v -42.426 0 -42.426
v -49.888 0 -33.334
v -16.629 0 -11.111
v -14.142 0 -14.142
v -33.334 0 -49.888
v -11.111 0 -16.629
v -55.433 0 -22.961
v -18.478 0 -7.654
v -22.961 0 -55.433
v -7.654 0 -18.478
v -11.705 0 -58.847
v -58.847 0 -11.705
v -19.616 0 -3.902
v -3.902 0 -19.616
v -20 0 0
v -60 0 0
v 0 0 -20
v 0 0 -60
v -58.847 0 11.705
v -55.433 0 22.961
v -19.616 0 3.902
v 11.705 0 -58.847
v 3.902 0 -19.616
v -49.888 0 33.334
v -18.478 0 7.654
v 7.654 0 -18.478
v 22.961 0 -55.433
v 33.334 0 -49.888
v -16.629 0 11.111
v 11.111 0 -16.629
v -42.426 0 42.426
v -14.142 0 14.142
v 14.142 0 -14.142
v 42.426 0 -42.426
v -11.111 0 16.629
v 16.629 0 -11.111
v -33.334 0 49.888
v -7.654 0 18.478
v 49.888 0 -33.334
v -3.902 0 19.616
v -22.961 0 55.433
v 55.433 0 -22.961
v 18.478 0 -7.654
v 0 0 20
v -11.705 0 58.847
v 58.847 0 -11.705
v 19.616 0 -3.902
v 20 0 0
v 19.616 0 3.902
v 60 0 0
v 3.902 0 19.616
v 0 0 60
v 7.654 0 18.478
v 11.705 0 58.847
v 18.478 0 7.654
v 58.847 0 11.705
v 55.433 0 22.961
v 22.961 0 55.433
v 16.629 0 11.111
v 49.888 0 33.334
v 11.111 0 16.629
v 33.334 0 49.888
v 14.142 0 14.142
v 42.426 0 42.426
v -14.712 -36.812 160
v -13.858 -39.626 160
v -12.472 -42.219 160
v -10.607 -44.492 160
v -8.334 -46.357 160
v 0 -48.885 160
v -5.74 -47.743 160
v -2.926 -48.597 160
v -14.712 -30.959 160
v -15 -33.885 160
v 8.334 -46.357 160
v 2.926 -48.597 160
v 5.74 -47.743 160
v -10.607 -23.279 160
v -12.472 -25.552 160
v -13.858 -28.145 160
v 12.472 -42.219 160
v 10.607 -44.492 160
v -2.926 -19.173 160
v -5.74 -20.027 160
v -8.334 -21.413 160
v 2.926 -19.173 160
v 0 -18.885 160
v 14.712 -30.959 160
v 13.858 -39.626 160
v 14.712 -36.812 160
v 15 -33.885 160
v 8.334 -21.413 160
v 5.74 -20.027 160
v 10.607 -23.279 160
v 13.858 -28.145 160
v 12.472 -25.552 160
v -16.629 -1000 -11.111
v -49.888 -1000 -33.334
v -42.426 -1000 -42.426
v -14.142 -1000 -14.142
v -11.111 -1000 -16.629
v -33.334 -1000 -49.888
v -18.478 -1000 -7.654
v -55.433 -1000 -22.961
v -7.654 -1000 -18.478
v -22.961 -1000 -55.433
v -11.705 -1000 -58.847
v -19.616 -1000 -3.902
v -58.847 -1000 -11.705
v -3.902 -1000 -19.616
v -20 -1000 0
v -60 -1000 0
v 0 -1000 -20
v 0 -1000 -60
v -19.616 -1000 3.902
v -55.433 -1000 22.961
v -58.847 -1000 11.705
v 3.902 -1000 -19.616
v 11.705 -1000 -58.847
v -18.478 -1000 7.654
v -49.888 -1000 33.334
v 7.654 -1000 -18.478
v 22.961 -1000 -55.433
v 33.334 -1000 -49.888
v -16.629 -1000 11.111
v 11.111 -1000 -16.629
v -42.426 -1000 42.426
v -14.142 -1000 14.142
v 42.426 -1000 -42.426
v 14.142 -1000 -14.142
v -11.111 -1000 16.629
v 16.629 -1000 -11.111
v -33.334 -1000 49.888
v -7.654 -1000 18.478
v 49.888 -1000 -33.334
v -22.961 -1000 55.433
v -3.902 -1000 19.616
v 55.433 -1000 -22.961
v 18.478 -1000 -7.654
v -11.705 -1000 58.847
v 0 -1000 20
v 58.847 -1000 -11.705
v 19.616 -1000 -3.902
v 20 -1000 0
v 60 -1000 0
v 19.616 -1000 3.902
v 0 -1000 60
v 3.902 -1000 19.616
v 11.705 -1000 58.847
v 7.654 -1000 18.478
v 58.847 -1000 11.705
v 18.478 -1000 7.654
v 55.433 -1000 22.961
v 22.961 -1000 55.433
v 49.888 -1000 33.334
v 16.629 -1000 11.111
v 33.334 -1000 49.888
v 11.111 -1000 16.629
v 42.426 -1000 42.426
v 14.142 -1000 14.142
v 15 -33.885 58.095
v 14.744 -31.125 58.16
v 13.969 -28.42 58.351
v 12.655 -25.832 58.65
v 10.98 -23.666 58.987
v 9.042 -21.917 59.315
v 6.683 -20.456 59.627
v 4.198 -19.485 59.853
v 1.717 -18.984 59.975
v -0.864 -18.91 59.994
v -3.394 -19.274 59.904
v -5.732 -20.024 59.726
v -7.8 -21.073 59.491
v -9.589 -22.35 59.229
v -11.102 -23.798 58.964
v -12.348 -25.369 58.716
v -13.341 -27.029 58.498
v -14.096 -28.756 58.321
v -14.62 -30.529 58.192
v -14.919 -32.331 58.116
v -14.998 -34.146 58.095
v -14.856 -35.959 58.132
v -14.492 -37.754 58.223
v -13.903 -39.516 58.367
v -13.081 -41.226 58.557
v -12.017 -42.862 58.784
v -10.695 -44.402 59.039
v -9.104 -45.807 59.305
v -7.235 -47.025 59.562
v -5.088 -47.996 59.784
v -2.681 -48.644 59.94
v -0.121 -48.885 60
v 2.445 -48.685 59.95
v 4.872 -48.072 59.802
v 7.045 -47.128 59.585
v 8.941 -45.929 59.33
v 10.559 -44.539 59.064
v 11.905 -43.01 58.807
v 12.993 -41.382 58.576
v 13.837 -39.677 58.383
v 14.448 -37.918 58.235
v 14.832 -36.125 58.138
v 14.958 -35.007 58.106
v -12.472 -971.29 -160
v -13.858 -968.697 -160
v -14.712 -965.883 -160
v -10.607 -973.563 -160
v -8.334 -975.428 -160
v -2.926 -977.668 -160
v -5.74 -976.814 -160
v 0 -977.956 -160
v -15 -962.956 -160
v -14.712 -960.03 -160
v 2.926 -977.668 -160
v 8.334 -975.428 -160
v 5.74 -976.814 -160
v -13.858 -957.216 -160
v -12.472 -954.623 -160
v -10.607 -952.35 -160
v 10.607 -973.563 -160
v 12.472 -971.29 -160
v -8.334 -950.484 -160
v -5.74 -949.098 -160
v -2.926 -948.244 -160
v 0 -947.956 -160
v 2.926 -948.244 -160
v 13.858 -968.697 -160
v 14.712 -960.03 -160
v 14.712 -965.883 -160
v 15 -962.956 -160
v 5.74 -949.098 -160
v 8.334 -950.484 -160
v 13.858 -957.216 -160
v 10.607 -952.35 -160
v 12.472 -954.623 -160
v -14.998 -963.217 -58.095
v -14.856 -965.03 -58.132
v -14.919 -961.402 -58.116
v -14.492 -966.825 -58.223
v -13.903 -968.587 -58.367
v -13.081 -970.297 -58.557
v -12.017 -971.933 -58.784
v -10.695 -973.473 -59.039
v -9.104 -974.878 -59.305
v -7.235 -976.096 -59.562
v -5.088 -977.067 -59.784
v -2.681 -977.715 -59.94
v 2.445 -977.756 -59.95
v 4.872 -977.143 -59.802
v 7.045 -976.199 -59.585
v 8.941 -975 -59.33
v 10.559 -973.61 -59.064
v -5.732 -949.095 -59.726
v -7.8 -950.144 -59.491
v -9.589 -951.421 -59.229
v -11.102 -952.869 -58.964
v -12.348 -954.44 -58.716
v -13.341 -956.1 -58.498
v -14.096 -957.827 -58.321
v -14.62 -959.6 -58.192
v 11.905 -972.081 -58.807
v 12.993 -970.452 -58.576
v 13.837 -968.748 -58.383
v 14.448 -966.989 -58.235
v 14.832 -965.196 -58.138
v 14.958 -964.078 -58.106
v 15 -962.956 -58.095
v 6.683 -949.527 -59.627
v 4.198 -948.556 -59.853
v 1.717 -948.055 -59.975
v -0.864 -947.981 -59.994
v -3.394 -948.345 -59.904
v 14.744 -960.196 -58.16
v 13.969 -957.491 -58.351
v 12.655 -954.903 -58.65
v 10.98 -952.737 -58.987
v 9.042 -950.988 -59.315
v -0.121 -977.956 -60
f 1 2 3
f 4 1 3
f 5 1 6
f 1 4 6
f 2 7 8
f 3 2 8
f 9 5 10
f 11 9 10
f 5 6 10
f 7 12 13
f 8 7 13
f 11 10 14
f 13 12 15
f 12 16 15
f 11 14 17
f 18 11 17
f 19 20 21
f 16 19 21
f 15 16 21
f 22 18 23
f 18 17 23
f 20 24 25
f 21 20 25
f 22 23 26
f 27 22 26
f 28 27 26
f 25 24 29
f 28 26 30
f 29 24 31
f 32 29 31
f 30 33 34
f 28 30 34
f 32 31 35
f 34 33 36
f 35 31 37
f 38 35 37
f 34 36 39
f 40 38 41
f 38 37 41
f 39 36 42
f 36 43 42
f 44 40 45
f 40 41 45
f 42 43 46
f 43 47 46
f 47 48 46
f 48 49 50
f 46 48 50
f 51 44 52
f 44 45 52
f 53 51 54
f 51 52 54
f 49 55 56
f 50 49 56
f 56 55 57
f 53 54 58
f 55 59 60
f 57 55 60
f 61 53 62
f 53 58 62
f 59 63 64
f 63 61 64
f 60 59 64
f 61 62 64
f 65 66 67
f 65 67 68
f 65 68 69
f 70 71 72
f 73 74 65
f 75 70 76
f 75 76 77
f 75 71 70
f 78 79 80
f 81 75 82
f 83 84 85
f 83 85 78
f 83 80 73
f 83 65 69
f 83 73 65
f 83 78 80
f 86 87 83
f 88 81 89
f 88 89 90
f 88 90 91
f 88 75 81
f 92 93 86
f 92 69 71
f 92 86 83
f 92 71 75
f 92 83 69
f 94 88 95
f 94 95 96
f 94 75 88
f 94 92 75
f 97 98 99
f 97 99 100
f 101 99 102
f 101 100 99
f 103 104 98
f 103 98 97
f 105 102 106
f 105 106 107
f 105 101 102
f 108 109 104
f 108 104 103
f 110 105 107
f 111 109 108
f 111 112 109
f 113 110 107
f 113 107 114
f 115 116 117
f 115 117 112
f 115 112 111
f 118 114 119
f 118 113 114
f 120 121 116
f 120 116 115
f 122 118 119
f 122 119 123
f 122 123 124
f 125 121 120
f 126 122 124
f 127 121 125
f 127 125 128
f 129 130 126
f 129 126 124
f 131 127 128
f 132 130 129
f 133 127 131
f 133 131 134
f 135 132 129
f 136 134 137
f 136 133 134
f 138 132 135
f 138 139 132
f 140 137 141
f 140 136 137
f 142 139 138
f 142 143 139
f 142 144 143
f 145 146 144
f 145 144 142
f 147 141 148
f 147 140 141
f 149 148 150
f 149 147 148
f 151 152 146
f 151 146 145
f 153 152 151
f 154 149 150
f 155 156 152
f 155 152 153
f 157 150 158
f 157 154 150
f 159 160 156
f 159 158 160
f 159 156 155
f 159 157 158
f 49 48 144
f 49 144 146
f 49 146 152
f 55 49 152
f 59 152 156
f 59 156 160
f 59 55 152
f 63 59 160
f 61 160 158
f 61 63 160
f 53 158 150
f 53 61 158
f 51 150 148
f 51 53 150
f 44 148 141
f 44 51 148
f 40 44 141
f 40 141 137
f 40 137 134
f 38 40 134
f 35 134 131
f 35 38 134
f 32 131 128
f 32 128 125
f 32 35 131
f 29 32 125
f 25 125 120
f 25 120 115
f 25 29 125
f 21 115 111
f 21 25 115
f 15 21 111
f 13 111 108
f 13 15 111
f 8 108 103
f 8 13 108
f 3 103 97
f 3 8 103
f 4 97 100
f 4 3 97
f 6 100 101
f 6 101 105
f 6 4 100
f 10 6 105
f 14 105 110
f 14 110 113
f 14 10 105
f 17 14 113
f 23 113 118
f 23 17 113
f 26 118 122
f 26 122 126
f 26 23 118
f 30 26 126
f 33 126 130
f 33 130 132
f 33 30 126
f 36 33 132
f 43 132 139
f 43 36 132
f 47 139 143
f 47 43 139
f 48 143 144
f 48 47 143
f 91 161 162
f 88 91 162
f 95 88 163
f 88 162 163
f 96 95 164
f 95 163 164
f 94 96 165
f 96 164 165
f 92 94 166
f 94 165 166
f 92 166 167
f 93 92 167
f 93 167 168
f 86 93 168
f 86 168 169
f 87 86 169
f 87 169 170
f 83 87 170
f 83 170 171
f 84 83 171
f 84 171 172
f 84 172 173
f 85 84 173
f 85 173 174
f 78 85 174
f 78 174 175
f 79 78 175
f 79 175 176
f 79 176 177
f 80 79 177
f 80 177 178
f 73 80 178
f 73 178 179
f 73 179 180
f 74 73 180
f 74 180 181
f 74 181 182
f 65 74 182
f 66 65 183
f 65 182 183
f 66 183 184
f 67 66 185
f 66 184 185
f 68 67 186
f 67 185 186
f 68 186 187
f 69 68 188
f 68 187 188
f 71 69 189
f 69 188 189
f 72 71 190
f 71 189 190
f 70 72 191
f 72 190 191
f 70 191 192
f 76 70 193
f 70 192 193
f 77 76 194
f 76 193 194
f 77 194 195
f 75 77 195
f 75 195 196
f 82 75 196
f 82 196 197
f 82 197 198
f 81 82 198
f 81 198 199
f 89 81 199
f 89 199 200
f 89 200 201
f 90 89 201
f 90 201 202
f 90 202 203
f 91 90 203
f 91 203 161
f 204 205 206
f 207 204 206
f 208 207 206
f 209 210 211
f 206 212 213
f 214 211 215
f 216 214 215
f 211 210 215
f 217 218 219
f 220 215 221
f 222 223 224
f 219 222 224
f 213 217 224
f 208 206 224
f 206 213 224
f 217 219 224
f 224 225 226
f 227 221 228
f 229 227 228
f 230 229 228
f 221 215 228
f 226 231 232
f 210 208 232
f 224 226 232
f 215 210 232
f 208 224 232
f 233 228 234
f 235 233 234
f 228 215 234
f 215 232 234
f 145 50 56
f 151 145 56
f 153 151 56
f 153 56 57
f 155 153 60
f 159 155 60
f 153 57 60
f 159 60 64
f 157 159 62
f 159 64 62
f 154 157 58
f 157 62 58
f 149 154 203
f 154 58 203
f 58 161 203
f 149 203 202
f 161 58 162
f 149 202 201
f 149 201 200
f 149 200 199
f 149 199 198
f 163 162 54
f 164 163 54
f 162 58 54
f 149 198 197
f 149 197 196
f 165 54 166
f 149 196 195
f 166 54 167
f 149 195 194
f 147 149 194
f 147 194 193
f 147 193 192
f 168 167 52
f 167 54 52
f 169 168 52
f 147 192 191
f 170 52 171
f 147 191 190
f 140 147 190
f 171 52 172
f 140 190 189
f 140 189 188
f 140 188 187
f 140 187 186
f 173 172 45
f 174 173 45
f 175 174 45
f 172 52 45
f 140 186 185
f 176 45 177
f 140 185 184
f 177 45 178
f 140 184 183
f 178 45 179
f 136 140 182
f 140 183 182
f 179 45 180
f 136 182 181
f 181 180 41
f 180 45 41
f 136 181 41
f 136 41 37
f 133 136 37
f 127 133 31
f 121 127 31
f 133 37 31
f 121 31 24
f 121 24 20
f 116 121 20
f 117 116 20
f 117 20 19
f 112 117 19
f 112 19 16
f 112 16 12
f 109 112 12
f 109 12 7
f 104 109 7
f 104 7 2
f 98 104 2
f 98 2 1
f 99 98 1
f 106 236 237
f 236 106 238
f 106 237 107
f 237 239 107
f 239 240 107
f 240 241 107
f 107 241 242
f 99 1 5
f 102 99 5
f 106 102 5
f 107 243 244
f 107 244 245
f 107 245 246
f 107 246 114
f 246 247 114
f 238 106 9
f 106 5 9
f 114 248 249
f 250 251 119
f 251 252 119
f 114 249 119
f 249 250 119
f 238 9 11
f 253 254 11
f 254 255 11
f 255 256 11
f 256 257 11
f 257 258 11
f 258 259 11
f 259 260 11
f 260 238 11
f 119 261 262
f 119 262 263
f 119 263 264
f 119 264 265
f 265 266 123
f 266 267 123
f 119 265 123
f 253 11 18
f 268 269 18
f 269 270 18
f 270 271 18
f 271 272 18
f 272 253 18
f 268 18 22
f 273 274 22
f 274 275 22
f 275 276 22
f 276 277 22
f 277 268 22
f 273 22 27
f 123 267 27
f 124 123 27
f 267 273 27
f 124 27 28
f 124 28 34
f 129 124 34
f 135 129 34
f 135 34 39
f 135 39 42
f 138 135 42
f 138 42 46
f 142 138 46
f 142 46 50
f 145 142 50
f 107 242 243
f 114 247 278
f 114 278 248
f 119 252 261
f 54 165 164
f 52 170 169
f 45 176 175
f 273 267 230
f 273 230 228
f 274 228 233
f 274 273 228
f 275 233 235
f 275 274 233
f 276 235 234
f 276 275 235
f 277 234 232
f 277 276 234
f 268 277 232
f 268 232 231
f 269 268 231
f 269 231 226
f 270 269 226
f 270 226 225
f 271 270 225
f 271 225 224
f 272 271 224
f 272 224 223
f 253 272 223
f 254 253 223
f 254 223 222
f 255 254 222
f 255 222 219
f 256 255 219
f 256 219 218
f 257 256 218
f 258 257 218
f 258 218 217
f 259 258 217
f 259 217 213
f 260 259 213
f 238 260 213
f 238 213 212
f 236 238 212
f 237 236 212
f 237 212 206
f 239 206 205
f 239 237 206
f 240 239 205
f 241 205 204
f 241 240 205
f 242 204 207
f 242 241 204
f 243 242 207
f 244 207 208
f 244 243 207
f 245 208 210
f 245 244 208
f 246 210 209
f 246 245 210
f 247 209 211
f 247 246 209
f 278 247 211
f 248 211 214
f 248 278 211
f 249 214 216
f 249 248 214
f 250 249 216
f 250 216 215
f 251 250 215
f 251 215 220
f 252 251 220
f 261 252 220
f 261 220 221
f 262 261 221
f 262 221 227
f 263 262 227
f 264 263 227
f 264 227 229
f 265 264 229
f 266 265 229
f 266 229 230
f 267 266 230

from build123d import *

# Parameters (mm, degrees)
F0_R     = 60
F2_DEPTH = 1000
F3_R     = 15
F4_DEPTH = 160
F5_R     = 15
F6_DEPTH = 160
F1_R     = 20
F7_DEPTH = 1000


with BuildPart() as f2:
    # F0 (on Front) → F2 (new body)
    with BuildSketch(Plane.XZ):
        Circle(F0_R)
    extrude(amount=F2_DEPTH)

    # F3 (on Top) → F4 (join)
    with BuildSketch(Plane.XY):
        with Locations((0, -33.885266772)):
            Circle(F3_R)
    extrude(amount=F4_DEPTH)

    # F5 (on Top) → F6 (join)
    with BuildSketch(Plane.XY):
        with Locations((0, -962.9562497139)):
            Circle(F5_R)
    extrude(amount=-F6_DEPTH)

    # F1 (on Front) → F7 (cut)
    with BuildSketch(Plane.XZ):
        Circle(F1_R)
    extrude(amount=F7_DEPTH, mode=Mode.SUBTRACT)


solid = f2.part
